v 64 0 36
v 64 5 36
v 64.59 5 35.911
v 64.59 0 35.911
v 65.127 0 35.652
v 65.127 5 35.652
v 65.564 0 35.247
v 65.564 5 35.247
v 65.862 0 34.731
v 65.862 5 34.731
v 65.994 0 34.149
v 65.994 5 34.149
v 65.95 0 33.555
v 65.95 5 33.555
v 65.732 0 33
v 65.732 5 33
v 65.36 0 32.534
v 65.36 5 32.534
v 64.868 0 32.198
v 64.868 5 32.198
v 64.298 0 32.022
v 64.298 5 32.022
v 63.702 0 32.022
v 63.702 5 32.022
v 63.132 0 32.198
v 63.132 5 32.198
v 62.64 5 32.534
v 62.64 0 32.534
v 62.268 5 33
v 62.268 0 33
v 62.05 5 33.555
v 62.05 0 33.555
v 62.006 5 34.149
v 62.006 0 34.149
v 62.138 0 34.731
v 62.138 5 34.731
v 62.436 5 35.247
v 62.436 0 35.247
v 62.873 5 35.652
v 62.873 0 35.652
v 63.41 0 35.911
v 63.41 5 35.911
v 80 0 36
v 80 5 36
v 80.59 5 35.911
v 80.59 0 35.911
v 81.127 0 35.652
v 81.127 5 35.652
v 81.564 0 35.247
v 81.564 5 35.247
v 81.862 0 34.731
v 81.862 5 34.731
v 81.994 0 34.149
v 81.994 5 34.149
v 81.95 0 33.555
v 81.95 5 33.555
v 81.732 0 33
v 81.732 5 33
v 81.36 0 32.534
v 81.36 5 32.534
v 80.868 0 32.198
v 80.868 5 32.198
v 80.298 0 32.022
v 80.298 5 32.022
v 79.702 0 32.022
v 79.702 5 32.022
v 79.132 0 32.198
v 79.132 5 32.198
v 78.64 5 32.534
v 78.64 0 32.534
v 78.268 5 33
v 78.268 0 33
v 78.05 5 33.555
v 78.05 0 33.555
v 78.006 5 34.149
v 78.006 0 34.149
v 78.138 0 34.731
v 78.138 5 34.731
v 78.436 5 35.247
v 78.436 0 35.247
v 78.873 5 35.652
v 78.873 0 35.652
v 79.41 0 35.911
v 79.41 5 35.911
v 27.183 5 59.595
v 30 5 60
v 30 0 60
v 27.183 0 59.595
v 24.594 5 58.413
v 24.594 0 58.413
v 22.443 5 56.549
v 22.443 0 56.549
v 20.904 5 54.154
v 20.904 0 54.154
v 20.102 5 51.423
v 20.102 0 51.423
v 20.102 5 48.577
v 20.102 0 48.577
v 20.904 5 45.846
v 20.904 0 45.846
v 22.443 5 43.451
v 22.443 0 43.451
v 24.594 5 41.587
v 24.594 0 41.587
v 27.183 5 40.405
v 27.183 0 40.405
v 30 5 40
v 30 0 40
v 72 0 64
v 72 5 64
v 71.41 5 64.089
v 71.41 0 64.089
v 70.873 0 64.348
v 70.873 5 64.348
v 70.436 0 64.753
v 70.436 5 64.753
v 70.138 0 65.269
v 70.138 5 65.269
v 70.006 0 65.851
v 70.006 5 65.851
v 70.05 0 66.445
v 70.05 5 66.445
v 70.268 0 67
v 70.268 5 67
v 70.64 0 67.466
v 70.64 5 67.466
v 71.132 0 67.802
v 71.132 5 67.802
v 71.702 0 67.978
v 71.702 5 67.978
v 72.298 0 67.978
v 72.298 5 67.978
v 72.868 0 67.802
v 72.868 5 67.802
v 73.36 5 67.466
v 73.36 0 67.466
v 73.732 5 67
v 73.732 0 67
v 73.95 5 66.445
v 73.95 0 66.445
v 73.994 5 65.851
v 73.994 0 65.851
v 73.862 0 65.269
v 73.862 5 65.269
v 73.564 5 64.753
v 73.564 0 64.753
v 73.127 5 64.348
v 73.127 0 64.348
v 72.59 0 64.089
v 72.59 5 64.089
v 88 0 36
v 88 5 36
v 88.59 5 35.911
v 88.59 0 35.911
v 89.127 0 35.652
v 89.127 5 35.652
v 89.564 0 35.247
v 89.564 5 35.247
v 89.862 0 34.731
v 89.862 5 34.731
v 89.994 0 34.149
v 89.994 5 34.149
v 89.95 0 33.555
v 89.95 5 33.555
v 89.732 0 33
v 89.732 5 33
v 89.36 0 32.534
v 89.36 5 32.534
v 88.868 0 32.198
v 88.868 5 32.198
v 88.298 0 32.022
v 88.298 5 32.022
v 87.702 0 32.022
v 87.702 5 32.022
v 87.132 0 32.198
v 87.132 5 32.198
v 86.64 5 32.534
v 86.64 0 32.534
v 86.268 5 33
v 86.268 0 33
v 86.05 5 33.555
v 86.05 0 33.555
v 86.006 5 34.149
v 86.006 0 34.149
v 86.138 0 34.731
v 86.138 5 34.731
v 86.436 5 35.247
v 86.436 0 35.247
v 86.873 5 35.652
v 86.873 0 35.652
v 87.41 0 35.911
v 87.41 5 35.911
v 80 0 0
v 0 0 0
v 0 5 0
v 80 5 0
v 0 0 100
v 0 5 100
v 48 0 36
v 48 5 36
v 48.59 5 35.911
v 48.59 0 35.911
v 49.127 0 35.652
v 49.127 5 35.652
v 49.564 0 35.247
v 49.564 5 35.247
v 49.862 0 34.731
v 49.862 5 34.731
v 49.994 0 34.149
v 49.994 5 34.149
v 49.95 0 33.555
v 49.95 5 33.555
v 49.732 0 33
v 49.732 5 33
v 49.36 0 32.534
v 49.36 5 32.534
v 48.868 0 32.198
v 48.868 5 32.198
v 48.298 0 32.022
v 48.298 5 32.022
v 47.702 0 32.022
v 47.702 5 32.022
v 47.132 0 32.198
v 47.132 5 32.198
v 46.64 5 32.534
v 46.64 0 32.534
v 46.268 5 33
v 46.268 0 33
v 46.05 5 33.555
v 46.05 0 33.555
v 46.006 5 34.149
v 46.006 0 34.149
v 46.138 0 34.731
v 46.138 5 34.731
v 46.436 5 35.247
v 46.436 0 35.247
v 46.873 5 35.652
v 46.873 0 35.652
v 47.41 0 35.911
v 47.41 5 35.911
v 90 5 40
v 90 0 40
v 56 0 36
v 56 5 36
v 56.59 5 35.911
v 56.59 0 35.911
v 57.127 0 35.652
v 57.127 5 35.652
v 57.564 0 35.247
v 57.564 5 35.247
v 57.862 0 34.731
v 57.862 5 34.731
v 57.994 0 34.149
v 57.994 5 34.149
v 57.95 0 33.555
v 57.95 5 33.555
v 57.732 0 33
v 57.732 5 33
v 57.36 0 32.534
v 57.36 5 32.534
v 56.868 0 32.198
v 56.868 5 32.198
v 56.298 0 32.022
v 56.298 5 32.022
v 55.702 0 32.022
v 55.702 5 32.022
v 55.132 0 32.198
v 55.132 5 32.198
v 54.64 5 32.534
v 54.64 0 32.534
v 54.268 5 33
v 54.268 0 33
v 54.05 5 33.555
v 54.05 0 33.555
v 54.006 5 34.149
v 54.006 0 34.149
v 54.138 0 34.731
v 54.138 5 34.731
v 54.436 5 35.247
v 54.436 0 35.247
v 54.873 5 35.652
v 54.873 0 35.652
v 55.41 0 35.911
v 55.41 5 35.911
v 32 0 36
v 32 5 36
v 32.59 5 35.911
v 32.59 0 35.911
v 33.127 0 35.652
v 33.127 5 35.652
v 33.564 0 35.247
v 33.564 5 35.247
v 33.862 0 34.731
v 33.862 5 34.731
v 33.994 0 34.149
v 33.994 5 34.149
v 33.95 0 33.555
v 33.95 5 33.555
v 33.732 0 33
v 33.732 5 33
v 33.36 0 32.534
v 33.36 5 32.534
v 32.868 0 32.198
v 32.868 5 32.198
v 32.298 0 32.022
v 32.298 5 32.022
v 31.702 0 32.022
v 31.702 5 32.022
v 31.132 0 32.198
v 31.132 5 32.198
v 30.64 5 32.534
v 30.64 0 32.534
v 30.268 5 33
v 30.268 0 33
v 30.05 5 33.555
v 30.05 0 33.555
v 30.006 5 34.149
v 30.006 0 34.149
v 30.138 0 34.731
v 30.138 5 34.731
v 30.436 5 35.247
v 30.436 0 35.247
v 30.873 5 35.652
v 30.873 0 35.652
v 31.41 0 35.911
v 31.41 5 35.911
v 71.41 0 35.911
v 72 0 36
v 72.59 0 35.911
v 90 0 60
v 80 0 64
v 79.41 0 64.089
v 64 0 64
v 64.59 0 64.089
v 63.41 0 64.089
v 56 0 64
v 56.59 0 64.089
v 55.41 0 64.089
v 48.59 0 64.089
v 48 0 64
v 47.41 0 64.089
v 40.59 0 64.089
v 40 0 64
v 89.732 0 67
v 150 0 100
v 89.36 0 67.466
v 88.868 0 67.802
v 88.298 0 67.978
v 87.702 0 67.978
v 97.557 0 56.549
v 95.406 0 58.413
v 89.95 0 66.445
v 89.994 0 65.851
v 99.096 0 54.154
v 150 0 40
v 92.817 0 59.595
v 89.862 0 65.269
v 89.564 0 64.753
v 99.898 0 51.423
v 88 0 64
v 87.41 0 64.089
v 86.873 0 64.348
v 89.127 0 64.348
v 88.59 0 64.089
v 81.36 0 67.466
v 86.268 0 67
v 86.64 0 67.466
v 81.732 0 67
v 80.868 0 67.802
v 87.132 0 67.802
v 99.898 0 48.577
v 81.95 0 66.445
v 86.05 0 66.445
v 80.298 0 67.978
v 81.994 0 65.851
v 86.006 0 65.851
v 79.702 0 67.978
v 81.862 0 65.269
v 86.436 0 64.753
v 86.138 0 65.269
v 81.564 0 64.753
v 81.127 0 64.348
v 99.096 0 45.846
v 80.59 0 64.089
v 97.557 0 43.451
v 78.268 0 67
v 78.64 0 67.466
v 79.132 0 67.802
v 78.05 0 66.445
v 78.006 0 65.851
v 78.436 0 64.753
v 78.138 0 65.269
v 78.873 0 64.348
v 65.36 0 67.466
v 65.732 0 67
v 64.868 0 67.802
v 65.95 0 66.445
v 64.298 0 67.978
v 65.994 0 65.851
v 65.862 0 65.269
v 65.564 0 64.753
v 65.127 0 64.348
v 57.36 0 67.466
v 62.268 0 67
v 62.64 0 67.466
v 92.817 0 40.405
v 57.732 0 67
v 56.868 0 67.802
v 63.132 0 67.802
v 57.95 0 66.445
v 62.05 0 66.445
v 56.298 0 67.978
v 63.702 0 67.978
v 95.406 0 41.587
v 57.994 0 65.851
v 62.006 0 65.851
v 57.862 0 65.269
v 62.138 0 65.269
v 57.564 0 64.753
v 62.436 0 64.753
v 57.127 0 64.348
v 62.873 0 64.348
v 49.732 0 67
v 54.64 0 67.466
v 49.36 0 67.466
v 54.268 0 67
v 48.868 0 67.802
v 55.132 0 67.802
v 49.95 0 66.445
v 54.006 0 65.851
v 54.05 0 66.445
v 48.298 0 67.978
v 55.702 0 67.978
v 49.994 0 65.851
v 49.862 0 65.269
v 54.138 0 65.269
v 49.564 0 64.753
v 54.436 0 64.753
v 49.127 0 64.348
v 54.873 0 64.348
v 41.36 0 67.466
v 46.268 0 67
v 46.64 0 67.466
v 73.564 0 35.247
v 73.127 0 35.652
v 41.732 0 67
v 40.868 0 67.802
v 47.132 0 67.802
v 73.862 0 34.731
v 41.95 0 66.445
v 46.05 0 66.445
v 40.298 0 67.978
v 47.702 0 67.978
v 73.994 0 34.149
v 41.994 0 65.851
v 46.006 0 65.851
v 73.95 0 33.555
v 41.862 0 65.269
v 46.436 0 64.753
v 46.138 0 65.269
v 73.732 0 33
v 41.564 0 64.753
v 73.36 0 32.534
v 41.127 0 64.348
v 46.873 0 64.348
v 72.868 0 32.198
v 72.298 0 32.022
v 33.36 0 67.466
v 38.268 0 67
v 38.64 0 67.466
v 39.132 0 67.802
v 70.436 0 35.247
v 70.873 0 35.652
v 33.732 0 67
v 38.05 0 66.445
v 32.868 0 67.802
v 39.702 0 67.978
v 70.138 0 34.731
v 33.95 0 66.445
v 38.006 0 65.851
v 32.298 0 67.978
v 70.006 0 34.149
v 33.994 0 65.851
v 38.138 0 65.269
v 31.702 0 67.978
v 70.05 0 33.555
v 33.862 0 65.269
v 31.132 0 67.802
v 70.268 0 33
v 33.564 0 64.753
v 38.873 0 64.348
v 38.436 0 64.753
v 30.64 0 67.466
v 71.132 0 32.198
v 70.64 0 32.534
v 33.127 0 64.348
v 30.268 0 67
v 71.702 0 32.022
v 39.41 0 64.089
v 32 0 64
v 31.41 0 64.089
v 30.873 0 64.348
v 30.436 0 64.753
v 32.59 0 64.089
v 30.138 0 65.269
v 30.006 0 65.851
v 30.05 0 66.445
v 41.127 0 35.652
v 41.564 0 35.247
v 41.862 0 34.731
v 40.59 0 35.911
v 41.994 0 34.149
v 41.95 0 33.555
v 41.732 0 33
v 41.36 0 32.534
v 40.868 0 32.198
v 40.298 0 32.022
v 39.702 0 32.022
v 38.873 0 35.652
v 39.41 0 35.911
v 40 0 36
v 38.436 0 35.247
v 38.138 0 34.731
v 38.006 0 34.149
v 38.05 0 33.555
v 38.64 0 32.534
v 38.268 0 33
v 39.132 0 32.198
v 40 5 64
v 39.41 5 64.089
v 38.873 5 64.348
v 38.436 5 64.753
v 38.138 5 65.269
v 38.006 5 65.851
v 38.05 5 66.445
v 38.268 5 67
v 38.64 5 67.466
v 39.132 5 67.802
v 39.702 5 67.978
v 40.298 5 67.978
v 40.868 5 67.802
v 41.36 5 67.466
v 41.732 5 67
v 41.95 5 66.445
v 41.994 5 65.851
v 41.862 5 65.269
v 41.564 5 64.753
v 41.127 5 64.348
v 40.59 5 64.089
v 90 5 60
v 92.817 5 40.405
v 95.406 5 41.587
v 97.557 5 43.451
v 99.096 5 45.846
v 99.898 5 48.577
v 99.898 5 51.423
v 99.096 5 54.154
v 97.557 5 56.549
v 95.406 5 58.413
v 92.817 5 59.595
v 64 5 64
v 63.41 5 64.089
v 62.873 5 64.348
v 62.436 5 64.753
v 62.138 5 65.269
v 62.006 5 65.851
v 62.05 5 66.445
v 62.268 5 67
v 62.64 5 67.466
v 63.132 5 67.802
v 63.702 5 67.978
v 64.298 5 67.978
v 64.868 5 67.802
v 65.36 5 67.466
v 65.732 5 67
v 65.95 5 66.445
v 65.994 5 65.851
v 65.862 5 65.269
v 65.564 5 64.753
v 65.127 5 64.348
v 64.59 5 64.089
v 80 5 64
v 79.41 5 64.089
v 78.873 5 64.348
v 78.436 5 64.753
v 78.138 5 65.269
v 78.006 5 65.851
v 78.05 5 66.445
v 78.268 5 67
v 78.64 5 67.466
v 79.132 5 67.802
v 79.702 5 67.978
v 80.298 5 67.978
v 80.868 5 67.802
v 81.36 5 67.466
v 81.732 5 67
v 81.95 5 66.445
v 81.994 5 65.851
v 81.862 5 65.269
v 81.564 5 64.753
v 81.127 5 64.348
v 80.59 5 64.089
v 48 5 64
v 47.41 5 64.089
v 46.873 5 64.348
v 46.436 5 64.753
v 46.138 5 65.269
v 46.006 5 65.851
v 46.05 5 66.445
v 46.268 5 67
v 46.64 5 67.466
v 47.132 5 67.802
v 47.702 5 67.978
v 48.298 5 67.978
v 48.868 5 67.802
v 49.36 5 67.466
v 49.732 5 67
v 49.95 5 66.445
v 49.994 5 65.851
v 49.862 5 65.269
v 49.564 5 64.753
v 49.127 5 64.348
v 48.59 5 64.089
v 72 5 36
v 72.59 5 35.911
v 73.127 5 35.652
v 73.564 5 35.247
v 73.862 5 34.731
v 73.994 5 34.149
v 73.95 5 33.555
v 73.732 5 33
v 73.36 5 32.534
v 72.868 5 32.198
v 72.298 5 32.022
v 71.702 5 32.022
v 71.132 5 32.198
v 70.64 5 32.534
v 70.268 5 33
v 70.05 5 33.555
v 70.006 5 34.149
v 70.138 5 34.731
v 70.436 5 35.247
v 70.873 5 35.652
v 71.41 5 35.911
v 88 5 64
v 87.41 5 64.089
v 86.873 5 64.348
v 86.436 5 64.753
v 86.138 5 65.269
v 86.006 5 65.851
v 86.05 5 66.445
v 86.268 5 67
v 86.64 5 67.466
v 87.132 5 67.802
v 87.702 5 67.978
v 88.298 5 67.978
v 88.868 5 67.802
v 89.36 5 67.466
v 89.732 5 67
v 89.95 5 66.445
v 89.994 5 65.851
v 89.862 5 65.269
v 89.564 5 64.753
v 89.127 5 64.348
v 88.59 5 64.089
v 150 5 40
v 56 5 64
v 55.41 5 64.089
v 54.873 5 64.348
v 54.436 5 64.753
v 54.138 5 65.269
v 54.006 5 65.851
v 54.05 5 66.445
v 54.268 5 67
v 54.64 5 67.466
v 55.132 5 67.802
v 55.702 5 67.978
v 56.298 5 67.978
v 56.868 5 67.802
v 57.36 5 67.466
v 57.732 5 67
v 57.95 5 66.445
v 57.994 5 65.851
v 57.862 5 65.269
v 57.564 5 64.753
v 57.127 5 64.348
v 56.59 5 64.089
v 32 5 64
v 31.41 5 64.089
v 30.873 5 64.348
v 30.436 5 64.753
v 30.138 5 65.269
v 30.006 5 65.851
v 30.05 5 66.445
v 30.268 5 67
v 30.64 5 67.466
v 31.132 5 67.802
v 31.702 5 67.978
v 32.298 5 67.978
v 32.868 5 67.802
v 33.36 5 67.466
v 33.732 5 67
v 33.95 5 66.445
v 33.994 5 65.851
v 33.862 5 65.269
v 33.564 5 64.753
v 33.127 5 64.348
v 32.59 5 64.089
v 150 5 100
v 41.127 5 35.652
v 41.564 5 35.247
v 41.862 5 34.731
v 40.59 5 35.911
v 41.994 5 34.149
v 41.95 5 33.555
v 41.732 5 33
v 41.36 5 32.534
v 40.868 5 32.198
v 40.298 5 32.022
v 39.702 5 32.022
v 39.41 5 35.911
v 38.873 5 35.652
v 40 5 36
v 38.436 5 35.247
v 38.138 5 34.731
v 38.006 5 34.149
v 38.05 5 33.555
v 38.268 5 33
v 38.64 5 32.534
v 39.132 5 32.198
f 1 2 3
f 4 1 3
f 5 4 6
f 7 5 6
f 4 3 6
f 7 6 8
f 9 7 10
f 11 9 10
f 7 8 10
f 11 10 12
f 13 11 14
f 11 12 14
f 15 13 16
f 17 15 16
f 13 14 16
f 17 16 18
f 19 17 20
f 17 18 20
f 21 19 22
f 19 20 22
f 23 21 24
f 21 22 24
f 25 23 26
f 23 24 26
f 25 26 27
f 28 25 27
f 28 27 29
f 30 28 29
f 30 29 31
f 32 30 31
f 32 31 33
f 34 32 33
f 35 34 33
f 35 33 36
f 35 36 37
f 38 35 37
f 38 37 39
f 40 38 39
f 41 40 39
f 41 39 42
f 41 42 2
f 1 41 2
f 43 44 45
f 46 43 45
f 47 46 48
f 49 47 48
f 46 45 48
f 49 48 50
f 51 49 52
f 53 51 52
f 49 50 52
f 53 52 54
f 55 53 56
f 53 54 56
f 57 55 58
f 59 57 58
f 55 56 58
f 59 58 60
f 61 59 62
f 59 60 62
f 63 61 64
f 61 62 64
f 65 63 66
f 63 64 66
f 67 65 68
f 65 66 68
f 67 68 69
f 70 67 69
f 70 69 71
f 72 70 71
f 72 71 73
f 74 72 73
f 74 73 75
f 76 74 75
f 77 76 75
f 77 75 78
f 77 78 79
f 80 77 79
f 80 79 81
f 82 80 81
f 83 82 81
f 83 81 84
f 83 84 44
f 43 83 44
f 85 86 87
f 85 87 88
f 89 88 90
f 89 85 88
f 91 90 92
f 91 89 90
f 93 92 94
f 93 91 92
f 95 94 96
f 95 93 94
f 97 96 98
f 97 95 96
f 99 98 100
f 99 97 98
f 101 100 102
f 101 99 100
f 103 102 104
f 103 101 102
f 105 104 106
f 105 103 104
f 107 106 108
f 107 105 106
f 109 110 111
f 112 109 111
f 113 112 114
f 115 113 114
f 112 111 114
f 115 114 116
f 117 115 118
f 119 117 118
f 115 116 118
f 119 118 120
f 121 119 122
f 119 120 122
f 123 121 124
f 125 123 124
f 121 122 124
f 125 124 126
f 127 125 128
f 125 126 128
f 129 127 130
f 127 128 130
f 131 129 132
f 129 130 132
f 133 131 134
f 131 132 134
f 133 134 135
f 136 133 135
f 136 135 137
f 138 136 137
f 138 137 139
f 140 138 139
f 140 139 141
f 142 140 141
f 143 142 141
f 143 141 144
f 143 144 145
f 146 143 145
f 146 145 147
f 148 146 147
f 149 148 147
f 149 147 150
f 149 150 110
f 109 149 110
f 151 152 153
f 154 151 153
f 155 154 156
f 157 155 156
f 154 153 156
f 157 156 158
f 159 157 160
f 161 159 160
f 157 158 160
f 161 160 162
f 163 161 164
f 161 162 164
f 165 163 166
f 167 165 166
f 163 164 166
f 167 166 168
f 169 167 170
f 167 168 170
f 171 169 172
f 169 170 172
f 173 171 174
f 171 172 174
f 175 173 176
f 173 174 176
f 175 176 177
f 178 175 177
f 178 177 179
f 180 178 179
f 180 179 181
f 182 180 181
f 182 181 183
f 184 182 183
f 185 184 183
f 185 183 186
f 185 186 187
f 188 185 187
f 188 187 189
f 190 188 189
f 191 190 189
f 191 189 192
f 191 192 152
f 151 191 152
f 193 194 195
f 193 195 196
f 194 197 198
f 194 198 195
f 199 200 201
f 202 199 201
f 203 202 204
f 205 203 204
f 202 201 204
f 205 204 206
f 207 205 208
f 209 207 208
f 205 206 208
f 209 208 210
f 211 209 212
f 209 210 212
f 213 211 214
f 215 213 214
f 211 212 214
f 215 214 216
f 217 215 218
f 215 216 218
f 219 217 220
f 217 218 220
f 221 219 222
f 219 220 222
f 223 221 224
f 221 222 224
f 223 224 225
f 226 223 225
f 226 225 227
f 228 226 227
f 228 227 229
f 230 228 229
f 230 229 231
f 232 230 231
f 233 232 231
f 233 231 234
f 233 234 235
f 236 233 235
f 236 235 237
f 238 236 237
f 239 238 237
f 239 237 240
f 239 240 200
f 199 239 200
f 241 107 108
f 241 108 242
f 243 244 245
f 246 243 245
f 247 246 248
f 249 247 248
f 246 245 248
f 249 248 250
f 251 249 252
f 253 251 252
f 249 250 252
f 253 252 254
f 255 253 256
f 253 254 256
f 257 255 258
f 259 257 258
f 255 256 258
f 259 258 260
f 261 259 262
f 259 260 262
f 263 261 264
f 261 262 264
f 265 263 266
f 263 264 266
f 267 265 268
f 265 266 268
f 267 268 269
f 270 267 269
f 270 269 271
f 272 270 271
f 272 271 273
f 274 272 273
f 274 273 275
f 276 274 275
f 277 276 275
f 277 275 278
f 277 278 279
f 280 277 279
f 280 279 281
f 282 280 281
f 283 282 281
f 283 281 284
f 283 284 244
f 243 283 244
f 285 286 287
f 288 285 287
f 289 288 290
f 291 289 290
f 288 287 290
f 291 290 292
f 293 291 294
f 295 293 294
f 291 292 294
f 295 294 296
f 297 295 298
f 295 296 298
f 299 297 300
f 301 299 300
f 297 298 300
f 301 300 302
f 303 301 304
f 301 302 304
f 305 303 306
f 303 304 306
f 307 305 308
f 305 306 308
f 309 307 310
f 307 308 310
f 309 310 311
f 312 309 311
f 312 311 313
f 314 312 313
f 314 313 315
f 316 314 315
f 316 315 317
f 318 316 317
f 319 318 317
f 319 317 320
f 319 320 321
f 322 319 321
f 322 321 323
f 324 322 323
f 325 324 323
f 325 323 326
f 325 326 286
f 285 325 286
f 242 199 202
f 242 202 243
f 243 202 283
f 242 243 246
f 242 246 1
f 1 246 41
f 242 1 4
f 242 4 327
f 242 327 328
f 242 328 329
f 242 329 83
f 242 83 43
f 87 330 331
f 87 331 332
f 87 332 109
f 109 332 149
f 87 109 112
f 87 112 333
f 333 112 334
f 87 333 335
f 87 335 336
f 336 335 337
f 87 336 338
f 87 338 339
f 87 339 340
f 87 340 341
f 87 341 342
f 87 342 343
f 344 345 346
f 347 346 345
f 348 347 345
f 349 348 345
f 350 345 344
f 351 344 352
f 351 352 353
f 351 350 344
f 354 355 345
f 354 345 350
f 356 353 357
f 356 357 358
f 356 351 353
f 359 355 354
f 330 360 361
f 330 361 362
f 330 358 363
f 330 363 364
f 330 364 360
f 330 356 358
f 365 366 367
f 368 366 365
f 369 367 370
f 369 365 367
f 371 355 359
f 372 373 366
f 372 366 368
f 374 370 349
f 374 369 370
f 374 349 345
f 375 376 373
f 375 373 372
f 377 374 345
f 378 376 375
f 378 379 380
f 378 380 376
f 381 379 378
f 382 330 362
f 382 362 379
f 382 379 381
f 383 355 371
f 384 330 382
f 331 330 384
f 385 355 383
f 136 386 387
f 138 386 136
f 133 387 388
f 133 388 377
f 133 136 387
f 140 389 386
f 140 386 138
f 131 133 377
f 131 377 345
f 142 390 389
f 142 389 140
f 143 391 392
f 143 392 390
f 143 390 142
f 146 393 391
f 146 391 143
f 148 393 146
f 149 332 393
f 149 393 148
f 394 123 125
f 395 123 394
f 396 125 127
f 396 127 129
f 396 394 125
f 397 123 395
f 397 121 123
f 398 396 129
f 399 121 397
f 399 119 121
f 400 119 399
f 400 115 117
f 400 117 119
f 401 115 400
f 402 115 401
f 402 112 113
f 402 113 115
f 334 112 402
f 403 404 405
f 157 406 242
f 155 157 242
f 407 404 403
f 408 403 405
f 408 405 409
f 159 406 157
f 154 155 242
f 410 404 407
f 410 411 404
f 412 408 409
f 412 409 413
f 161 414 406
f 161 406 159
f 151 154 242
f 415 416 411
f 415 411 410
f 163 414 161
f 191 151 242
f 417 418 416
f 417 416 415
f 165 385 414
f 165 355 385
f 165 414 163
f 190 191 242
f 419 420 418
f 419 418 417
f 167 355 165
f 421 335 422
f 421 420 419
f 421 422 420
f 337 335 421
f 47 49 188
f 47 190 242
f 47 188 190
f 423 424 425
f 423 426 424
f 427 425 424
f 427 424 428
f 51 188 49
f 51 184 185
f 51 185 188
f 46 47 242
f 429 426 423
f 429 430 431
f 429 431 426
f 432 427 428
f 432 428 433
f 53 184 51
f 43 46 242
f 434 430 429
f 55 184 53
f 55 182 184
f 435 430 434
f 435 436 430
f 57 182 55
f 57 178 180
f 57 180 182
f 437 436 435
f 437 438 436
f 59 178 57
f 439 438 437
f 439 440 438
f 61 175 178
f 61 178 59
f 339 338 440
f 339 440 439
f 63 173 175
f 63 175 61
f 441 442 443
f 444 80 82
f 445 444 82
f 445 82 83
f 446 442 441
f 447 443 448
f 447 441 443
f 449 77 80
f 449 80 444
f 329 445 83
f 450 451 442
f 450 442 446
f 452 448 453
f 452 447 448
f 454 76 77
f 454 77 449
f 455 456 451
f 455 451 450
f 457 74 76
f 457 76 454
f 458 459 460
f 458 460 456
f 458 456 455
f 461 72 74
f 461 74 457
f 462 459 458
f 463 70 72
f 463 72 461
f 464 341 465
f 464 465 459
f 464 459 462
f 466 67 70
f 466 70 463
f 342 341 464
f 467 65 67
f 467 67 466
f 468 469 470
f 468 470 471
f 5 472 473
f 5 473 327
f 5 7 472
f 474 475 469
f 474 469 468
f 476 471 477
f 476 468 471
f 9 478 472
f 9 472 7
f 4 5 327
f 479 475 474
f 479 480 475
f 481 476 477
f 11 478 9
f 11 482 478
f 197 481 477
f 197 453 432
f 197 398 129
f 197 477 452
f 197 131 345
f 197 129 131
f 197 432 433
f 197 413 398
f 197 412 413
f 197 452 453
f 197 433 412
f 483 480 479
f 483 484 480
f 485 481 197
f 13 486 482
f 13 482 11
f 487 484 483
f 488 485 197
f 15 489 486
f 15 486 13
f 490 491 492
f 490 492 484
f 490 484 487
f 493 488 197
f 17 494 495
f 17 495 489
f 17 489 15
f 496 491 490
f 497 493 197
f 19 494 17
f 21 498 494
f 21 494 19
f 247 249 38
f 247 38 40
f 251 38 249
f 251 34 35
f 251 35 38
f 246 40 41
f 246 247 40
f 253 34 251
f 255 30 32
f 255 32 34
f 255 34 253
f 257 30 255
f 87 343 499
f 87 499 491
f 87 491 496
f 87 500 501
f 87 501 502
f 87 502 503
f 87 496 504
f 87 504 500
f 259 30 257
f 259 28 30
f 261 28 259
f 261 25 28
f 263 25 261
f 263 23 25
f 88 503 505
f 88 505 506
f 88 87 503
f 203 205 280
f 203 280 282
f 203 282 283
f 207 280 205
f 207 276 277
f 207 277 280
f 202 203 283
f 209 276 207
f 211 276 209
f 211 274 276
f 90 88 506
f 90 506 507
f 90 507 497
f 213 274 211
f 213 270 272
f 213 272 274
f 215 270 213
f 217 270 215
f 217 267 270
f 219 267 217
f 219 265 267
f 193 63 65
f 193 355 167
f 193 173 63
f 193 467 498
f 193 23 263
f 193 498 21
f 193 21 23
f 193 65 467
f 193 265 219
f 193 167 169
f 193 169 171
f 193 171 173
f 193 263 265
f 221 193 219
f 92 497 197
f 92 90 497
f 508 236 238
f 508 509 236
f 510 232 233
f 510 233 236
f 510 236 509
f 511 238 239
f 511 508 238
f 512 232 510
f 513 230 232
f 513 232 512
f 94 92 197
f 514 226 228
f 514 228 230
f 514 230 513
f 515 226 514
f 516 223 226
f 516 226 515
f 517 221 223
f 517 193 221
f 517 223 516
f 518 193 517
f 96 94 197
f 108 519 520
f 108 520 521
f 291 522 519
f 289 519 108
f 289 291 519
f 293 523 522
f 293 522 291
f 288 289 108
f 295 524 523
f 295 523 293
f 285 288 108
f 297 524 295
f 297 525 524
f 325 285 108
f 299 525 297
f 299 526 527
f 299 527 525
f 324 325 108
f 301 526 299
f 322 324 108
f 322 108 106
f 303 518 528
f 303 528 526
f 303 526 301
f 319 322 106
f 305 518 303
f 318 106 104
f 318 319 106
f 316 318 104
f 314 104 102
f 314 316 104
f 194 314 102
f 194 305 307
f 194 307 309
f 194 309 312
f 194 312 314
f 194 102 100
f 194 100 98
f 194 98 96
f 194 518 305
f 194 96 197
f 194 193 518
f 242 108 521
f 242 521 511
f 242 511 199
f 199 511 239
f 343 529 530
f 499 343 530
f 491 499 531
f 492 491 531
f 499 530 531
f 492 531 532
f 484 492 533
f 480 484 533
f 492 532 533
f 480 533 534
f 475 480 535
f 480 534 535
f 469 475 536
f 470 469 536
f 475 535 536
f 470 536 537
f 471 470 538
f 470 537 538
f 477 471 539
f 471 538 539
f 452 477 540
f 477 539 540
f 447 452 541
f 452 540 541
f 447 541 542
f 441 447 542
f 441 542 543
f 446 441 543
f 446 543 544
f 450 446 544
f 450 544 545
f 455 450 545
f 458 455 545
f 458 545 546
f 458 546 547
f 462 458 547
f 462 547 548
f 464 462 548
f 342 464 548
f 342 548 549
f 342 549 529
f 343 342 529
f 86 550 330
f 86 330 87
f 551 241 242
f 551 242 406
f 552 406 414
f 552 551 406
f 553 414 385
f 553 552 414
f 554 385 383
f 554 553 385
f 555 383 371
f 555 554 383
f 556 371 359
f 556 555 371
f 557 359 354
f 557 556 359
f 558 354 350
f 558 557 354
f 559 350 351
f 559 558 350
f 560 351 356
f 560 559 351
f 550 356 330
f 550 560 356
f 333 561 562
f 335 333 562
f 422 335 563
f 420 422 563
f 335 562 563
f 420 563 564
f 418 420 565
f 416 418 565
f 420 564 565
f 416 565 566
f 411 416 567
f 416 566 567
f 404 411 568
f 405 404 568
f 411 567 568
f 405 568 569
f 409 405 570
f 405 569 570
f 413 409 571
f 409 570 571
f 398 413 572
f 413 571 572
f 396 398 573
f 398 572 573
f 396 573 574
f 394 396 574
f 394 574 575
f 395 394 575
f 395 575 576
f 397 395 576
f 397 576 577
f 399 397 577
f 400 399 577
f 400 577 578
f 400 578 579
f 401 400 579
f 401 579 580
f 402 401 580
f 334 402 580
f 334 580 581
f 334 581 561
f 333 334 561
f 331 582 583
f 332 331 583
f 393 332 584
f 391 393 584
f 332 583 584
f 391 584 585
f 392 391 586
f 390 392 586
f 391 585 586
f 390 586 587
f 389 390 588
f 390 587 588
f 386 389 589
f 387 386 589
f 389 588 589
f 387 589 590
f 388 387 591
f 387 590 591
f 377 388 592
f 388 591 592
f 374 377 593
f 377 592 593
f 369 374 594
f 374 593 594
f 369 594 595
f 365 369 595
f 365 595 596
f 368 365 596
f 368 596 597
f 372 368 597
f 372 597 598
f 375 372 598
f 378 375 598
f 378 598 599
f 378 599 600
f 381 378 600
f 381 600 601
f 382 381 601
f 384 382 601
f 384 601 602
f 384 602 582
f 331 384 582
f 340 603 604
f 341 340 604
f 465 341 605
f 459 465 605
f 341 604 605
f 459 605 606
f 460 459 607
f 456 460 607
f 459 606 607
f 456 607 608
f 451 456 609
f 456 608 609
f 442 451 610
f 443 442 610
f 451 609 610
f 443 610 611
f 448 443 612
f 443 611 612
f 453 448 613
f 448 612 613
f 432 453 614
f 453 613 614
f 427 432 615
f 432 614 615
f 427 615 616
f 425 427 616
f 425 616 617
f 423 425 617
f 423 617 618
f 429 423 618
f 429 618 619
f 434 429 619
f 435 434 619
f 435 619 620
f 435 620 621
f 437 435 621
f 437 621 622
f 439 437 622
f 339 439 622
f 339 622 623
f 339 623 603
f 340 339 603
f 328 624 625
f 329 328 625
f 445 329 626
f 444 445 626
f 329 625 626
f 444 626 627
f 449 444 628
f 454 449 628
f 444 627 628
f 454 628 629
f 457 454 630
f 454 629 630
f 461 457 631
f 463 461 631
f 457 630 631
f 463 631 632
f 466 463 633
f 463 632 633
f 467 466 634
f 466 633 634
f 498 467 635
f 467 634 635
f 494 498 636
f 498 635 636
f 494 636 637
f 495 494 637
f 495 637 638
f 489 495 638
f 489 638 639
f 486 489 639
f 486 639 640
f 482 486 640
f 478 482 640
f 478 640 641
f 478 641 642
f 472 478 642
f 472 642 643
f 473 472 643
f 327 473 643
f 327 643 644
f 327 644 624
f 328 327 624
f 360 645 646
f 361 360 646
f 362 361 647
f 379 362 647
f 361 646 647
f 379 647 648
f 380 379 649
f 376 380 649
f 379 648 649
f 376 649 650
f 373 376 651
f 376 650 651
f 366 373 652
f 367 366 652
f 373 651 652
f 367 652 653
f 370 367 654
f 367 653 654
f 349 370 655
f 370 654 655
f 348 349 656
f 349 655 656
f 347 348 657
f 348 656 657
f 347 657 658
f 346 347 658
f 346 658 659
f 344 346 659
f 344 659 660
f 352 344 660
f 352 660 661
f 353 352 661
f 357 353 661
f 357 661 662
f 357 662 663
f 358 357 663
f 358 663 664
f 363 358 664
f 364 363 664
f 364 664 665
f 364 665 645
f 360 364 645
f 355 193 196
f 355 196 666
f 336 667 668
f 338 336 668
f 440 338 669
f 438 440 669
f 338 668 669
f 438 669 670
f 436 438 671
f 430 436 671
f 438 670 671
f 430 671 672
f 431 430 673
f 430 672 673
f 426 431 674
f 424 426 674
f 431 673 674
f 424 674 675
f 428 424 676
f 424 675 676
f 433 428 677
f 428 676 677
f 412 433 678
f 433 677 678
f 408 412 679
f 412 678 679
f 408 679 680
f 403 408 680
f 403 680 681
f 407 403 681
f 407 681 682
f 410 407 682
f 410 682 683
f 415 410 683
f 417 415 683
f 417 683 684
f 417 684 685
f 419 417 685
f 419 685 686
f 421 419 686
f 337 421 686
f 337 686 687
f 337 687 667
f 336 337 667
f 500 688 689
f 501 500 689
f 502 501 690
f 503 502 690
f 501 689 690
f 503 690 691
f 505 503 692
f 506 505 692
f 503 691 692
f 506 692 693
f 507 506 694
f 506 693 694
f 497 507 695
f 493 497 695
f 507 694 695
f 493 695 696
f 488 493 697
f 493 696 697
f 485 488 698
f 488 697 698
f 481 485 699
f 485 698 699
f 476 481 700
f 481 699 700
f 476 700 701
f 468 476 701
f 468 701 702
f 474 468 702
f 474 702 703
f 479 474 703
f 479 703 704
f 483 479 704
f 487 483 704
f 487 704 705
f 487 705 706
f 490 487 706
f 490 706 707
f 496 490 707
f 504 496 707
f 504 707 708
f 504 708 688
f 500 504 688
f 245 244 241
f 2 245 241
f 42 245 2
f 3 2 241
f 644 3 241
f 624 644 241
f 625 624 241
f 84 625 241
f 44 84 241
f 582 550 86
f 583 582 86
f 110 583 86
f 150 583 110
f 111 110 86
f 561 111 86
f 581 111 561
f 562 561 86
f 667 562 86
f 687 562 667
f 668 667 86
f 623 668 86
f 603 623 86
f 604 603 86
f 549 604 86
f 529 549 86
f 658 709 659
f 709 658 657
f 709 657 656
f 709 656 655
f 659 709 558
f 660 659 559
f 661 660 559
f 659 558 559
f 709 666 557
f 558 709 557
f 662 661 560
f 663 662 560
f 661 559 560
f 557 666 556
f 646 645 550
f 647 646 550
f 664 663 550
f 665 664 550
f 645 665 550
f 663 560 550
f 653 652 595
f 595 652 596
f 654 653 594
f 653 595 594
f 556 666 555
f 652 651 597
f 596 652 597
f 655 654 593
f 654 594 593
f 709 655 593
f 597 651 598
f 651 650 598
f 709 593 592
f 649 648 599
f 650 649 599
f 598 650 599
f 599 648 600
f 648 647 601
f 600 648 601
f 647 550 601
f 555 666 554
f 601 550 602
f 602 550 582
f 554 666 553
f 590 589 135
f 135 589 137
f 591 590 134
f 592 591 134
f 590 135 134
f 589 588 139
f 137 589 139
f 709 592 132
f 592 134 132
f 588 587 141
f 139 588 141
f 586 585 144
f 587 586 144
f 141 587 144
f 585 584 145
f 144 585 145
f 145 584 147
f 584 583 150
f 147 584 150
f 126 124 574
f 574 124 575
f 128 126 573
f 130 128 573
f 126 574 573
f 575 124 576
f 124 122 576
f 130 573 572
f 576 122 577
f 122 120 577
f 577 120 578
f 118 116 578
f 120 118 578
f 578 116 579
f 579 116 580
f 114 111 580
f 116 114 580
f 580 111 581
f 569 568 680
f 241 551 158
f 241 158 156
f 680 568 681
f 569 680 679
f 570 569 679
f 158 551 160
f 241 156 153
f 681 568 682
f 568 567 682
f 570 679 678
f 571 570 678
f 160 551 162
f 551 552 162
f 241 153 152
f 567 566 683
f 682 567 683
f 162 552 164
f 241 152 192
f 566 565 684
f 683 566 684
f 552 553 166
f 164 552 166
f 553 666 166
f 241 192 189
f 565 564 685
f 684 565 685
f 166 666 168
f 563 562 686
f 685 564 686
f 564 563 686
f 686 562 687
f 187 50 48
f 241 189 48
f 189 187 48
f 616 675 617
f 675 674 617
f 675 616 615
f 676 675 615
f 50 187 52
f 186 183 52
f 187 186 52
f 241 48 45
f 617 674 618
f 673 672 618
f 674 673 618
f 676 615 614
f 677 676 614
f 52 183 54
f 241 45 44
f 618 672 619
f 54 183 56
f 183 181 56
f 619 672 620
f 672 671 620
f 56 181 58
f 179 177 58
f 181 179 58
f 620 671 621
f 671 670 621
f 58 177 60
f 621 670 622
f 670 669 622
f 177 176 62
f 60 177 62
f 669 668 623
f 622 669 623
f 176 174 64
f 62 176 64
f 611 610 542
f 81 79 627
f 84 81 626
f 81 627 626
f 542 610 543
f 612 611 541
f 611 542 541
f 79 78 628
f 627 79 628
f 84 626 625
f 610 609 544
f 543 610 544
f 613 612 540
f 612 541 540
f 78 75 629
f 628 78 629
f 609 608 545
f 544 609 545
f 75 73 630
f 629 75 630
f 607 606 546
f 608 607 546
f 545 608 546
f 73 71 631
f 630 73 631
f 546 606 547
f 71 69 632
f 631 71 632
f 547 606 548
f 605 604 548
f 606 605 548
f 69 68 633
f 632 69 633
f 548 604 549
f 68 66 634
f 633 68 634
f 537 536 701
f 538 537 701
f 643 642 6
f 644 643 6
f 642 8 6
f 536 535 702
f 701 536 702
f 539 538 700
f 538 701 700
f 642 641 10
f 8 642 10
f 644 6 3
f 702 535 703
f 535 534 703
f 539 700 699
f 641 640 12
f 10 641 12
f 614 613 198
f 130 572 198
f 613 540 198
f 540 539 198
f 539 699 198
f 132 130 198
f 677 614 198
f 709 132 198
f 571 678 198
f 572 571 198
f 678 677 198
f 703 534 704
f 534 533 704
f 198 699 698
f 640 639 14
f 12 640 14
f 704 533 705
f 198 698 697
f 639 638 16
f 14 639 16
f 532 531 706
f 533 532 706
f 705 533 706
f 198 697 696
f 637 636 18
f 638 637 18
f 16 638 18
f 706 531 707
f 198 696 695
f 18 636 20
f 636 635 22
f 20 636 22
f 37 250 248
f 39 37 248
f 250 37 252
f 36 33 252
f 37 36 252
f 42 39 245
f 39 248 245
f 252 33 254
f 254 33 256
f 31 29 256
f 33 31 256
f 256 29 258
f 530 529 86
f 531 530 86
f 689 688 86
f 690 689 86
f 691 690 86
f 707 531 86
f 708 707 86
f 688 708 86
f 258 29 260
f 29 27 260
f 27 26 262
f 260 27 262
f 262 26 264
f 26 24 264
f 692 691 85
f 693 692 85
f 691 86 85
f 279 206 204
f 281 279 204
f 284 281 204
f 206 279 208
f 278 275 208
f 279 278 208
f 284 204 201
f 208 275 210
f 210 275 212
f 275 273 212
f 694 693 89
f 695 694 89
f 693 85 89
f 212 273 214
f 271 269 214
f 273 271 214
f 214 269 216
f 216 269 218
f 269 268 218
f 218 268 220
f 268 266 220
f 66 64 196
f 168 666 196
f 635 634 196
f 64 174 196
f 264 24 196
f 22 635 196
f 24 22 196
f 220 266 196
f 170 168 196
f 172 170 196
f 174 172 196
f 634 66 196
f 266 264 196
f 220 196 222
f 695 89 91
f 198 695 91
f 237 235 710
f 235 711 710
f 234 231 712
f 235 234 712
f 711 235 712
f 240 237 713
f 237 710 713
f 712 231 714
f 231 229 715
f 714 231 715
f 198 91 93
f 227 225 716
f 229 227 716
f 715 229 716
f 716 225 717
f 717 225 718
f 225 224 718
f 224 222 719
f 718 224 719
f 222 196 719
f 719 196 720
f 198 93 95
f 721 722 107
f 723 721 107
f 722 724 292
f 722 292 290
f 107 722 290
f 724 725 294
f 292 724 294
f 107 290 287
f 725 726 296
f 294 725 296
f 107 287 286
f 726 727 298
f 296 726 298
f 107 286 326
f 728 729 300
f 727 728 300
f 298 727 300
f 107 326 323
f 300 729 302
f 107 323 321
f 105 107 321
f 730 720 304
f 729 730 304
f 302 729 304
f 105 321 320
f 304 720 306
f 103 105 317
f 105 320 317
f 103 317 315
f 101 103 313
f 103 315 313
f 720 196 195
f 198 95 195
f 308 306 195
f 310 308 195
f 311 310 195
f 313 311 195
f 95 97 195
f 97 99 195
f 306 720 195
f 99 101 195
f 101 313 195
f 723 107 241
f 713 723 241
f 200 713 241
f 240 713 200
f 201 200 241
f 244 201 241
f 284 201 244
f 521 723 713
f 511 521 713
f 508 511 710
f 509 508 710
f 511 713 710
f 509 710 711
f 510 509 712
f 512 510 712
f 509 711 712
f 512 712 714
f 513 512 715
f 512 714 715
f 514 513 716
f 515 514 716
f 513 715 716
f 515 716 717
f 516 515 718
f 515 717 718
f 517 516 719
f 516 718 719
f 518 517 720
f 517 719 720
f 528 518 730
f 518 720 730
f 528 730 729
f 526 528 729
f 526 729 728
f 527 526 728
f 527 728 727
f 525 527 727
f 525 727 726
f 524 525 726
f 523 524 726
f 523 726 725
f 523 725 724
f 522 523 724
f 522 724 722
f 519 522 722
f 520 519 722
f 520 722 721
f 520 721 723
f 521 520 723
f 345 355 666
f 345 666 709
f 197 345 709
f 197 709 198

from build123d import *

# Parameters (mm, degrees)
BOSS_EXTRUDE1_DEPTH = 5
SKETCH2_R           = 2
CUT_EXTRUDE1_DEPTH  = 181.346887969


with BuildPart() as part:
    # Sketch1 → Boss-Extrude1 (new body)
    with BuildSketch(Plane(origin=(0, 0, 0), x_dir=(1, 0, 0), z_dir=(0, 1, 0))):
        Polygon((0, 0), (80, 0), (150, -40), (150, -100), (0, -100), align=None)
    extrude(amount=BOSS_EXTRUDE1_DEPTH)

    # Sketch2 → Cut-Extrude1 (cut, through all)
    with BuildSketch(Plane(origin=(0, 5, 0), x_dir=(1, 0, 0), z_dir=(0, 1, 0))):
        with Locations(Location((32, -34, 0), (0, 0, 270))):
            Circle(SKETCH2_R)
        with Locations(Location((40, -34, 0), (0, 0, 270))):
            Circle(SKETCH2_R)
        with Locations(Location((48, -34, 0), (0, 0, 270))):
            Circle(SKETCH2_R)
        with Locations(Location((56, -34, 0), (0, 0, 270))):
            Circle(SKETCH2_R)
        with Locations(Location((64, -34, 0), (0, 0, 270))):
            Circle(SKETCH2_R)
        with Locations(Location((72, -34, 0), (0, 0, 270))):
            Circle(SKETCH2_R)
        with Locations(Location((80, -34, 0), (0, 0, 270))):
            Circle(SKETCH2_R)
        with Locations(Location((88, -34, 0), (0, 0, 270))):
            Circle(SKETCH2_R)
        with Locations(Location((88, -66, 0), (0, 0, 90))):
            Circle(SKETCH2_R)
        with Locations(Location((80, -66, 0), (0, 0, 90))):
            Circle(SKETCH2_R)
        with Locations(Location((72, -66, 0), (0, 0, 90))):
            Circle(SKETCH2_R)
        with Locations(Location((64, -66, 0), (0, 0, 90))):
            Circle(SKETCH2_R)
        with Locations(Location((56, -66, 0), (0, 0, 90))):
            Circle(SKETCH2_R)
        with Locations(Location((48, -66, 0), (0, 0, 90))):
            Circle(SKETCH2_R)
        with Locations(Location((40, -66, 0), (0, 0, 90))):
            Circle(SKETCH2_R)
        with Locations(Location((32, -66, 0), (0, 0, 90))):
            Circle(SKETCH2_R)
        with BuildLine():
            Line((30, -40), (90, -40))
            ThreePointArc((90, -40), (100, -50), (90, -60))
            Line((90, -60), (30, -60))
            ThreePointArc((30, -60), (20, -50), (30, -40))
        make_face()
    extrude(amount=-CUT_EXTRUDE1_DEPTH, mode=Mode.SUBTRACT)


solid = part.part
